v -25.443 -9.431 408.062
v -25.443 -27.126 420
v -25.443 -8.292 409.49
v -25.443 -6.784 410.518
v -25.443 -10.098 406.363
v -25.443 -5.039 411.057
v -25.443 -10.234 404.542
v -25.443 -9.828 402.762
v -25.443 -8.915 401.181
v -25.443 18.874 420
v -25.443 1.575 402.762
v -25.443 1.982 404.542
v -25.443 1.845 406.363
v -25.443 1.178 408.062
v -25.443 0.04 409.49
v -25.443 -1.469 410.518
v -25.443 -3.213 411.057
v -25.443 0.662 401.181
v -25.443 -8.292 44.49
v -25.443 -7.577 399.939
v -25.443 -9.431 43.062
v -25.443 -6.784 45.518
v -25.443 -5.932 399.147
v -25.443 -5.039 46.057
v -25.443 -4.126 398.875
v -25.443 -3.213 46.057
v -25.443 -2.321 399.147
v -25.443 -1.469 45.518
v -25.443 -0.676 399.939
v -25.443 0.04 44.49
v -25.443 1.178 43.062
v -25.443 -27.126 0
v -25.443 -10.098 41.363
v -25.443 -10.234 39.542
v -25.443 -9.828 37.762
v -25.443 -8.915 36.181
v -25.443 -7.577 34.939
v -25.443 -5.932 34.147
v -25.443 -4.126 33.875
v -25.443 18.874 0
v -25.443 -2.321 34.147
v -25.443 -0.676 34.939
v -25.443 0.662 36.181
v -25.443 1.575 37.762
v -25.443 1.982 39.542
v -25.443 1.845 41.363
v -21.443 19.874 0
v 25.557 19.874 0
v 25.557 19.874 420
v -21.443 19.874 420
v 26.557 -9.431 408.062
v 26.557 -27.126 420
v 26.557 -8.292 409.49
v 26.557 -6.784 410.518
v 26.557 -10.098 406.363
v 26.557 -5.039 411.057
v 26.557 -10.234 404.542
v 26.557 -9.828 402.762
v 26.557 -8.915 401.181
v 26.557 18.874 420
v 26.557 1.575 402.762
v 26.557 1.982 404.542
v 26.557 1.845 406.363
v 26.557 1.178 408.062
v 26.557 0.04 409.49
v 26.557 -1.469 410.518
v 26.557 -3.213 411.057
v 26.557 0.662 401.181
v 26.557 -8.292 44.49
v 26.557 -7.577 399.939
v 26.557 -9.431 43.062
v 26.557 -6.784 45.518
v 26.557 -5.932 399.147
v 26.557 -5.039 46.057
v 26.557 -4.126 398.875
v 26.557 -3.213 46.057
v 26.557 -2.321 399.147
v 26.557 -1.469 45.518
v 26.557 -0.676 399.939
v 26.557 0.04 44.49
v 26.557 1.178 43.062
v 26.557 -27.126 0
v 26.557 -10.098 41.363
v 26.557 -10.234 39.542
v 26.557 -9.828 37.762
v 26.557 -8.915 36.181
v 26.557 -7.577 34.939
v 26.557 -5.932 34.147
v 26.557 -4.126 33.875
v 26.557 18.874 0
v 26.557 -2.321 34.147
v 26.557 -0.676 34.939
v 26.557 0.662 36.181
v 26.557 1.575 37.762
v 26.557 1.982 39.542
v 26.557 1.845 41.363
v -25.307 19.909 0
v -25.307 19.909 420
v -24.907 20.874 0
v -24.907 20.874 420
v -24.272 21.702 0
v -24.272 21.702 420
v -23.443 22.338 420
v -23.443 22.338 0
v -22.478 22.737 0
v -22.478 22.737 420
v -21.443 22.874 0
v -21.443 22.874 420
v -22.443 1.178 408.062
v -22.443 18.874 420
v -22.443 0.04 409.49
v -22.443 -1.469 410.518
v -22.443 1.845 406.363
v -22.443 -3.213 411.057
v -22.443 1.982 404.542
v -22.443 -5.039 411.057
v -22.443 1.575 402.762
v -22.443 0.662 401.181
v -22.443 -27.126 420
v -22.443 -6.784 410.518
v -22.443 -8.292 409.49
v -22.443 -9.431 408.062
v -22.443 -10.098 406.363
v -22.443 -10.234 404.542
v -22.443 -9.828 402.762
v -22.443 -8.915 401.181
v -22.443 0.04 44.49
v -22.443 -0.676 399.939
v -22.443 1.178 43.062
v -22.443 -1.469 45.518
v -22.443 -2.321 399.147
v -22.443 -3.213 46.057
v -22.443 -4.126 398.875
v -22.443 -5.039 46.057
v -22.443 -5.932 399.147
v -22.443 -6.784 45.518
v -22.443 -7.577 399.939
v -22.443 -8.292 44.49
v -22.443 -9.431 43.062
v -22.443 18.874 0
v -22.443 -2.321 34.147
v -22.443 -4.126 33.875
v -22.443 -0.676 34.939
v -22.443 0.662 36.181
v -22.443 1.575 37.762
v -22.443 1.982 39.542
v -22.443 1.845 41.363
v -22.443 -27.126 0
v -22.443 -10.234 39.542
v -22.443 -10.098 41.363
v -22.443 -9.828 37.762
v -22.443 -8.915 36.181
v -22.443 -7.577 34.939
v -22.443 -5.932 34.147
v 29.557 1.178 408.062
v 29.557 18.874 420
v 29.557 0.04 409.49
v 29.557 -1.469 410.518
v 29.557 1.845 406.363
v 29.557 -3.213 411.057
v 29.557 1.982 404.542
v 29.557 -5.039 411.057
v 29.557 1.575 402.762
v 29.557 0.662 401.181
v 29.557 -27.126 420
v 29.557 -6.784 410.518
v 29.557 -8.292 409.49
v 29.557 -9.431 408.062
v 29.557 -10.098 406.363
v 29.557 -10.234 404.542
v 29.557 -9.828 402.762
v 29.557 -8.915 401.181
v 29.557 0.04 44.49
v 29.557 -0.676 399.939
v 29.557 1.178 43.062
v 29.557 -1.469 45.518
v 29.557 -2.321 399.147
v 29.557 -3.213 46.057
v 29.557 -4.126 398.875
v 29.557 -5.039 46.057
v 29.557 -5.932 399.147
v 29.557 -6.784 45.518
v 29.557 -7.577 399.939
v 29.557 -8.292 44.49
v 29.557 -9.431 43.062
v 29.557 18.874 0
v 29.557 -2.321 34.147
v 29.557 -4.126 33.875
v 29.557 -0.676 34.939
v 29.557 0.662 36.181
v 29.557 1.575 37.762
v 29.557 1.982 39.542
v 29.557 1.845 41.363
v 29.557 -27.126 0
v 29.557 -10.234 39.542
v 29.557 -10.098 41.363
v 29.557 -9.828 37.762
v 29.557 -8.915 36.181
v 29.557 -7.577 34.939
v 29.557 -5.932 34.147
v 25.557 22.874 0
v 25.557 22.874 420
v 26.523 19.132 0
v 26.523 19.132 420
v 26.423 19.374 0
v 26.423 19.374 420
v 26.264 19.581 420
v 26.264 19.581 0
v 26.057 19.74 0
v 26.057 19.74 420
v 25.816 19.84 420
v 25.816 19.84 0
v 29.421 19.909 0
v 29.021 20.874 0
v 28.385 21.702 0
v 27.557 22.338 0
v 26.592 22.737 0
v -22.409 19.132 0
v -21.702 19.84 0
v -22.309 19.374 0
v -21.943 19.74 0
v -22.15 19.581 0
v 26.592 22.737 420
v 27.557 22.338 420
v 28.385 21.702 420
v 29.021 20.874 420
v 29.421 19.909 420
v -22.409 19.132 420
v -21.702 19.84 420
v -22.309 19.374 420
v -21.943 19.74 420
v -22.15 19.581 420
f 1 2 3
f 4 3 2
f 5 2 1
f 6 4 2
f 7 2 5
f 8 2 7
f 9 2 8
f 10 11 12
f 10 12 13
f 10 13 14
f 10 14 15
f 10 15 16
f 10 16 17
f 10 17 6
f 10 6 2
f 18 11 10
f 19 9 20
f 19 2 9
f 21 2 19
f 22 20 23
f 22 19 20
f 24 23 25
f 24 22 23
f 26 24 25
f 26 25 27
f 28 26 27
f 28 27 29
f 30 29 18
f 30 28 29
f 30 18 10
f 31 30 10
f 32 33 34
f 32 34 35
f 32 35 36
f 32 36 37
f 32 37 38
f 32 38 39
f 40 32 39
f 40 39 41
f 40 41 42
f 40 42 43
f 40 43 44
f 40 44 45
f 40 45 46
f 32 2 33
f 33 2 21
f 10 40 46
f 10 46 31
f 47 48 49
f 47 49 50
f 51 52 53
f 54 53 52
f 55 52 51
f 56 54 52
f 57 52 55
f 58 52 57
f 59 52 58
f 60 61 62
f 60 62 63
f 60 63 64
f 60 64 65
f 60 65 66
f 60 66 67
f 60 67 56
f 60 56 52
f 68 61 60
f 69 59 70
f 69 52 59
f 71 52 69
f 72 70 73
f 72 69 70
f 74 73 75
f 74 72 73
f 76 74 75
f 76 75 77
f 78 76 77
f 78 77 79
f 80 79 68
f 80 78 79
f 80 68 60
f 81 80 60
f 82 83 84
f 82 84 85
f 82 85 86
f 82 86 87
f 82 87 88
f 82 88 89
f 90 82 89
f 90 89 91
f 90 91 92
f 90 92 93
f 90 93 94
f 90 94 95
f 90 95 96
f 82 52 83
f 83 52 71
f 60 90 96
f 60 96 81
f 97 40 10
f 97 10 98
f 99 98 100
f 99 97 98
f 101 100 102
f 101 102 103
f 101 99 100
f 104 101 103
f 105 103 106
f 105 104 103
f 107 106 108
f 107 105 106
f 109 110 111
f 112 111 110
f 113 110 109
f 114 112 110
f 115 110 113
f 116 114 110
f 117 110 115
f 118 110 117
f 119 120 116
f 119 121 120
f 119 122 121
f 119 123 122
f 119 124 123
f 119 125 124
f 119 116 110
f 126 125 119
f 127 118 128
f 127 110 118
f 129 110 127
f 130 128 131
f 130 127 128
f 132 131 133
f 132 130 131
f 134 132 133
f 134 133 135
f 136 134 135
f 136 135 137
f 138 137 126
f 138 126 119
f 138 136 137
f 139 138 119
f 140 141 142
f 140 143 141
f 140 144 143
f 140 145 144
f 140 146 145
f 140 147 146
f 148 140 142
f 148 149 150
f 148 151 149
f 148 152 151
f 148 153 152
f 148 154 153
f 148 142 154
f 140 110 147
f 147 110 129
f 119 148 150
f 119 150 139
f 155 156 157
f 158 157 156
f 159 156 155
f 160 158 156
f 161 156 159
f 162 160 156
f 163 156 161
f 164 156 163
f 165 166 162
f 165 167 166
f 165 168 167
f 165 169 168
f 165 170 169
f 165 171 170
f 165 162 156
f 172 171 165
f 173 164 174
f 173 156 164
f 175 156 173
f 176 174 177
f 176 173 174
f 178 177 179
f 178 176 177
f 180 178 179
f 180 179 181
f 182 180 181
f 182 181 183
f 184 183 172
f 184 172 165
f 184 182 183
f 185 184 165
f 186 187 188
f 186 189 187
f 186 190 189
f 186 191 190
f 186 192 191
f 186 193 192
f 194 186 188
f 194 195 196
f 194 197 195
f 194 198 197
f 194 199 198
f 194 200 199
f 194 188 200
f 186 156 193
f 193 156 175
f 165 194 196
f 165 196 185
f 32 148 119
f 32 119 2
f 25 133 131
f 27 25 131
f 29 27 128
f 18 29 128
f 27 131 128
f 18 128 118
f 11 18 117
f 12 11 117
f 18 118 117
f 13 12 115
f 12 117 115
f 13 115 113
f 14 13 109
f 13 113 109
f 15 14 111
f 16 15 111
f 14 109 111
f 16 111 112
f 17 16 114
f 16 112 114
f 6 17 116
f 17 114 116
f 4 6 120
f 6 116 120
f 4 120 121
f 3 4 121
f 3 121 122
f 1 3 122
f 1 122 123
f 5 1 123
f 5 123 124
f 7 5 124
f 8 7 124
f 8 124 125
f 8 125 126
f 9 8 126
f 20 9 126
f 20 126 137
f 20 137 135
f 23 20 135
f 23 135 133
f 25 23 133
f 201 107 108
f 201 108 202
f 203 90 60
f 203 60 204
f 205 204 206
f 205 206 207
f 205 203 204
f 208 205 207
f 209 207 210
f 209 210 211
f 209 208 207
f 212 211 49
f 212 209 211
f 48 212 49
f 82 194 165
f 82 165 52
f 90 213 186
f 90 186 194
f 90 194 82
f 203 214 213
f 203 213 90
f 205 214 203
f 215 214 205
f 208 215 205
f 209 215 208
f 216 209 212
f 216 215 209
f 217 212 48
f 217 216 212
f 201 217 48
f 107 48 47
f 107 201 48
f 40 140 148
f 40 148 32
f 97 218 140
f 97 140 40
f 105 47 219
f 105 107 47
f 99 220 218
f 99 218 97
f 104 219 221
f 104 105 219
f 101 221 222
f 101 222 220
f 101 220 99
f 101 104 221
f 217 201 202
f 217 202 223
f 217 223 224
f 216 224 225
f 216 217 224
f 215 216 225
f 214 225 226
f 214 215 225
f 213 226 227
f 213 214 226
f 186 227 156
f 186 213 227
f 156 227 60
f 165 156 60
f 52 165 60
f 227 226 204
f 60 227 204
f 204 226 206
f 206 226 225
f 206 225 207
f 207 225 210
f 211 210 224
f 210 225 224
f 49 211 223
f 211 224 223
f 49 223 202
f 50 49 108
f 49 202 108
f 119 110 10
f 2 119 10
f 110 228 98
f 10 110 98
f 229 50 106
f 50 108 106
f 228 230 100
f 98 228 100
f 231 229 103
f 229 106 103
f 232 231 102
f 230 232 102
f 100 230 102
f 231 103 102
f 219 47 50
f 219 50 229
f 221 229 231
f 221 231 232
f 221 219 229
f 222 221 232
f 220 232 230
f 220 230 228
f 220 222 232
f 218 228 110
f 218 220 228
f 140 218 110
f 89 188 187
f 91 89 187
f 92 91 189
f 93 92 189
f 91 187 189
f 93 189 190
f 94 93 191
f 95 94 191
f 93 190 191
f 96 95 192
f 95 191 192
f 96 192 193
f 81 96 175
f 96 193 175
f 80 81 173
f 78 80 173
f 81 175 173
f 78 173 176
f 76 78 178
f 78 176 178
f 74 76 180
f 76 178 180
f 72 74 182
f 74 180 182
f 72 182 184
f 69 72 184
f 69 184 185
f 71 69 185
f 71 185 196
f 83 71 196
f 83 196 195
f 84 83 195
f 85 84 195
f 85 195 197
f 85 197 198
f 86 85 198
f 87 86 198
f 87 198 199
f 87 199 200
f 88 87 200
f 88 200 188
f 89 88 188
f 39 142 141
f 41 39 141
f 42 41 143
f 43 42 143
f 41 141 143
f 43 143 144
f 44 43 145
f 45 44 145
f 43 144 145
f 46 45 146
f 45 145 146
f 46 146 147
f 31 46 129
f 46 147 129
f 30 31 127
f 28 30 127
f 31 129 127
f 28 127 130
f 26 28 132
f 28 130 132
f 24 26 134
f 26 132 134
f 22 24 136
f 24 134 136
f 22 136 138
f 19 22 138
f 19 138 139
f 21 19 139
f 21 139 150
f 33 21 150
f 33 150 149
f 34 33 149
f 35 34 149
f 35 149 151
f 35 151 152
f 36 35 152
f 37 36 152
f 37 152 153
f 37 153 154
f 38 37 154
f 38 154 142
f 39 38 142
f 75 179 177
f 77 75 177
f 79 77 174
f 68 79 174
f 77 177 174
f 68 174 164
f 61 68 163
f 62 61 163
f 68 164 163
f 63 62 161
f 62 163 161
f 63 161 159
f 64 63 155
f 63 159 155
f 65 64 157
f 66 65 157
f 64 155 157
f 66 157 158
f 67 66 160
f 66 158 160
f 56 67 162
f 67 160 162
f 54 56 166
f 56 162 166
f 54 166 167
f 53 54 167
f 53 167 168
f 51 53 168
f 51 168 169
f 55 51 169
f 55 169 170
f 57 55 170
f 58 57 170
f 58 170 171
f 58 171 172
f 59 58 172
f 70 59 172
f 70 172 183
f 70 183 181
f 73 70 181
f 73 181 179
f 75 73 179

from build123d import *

# Parameters (mm, degrees)
EKSTR_ZYON_NCE6_DEPTH                 = 420
M12_HELISARMAL_I_IN_Z_VANA_MATKAB_2_D = 12.25
M12_HELISARMAL_I_IN_Z_VANA_MATKAB_1_D = 12.25


with BuildPart() as part:
    # Çizim1 → Ekstrüzyon-İnce6 (new body)
    with BuildSketch(Plane.XY):
        with BuildLine():
            Line((-25.44311251, -27.126351083), (-25.44311251, 18.873648917))
            ThreePointArc((-25.44311251, 18.873648917), (-24.271539634, 21.702076041), (-21.44311251, 22.873648917))
            Line((-21.44311251, 22.873648917), (25.55688749, 22.873648917))
            ThreePointArc((25.55688749, 22.873648917), (28.385314615, 21.702076041), (29.55688749, 18.873648917))
            Line((29.55688749, 18.873648917), (29.55688749, -27.126351083))
            Line((29.55688749, -27.126351083), (26.55688749, -27.126351083))
            Line((26.55688749, -27.126351083), (26.55688749, 18.873648917))
            ThreePointArc((26.55688749, 18.873648917), (26.263994271, 19.580755698), (25.55688749, 19.873648917))
            Line((25.55688749, 19.873648917), (-21.44311251, 19.873648917))
            ThreePointArc((-21.44311251, 19.873648917), (-22.150219291, 19.580755698), (-22.44311251, 18.873648917))
            Line((-22.44311251, 18.873648917), (-22.44311251, -27.126351083))
            Line((-22.44311251, -27.126351083), (-25.44311251, -27.126351083))
        make_face()
    extrude(amount=EKSTR_ZYON_NCE6_DEPTH)

    # M12 Helisarmal için Zıvana matkabı2 (through all)
    with Locations(Plane.ZY.offset(25.44311251)):
        with Locations((40, -4.126351083)):
            Hole(M12_HELISARMAL_I_IN_Z_VANA_MATKAB_2_D / 2)

    # M12 Helisarmal için Zıvana matkabı1 (through all)
    with Locations(Plane.ZY.offset(25.44311251)):
        with Locations((405, -4.126351083)):
            Hole(M12_HELISARMAL_I_IN_Z_VANA_MATKAB_1_D / 2)


solid = part.part
